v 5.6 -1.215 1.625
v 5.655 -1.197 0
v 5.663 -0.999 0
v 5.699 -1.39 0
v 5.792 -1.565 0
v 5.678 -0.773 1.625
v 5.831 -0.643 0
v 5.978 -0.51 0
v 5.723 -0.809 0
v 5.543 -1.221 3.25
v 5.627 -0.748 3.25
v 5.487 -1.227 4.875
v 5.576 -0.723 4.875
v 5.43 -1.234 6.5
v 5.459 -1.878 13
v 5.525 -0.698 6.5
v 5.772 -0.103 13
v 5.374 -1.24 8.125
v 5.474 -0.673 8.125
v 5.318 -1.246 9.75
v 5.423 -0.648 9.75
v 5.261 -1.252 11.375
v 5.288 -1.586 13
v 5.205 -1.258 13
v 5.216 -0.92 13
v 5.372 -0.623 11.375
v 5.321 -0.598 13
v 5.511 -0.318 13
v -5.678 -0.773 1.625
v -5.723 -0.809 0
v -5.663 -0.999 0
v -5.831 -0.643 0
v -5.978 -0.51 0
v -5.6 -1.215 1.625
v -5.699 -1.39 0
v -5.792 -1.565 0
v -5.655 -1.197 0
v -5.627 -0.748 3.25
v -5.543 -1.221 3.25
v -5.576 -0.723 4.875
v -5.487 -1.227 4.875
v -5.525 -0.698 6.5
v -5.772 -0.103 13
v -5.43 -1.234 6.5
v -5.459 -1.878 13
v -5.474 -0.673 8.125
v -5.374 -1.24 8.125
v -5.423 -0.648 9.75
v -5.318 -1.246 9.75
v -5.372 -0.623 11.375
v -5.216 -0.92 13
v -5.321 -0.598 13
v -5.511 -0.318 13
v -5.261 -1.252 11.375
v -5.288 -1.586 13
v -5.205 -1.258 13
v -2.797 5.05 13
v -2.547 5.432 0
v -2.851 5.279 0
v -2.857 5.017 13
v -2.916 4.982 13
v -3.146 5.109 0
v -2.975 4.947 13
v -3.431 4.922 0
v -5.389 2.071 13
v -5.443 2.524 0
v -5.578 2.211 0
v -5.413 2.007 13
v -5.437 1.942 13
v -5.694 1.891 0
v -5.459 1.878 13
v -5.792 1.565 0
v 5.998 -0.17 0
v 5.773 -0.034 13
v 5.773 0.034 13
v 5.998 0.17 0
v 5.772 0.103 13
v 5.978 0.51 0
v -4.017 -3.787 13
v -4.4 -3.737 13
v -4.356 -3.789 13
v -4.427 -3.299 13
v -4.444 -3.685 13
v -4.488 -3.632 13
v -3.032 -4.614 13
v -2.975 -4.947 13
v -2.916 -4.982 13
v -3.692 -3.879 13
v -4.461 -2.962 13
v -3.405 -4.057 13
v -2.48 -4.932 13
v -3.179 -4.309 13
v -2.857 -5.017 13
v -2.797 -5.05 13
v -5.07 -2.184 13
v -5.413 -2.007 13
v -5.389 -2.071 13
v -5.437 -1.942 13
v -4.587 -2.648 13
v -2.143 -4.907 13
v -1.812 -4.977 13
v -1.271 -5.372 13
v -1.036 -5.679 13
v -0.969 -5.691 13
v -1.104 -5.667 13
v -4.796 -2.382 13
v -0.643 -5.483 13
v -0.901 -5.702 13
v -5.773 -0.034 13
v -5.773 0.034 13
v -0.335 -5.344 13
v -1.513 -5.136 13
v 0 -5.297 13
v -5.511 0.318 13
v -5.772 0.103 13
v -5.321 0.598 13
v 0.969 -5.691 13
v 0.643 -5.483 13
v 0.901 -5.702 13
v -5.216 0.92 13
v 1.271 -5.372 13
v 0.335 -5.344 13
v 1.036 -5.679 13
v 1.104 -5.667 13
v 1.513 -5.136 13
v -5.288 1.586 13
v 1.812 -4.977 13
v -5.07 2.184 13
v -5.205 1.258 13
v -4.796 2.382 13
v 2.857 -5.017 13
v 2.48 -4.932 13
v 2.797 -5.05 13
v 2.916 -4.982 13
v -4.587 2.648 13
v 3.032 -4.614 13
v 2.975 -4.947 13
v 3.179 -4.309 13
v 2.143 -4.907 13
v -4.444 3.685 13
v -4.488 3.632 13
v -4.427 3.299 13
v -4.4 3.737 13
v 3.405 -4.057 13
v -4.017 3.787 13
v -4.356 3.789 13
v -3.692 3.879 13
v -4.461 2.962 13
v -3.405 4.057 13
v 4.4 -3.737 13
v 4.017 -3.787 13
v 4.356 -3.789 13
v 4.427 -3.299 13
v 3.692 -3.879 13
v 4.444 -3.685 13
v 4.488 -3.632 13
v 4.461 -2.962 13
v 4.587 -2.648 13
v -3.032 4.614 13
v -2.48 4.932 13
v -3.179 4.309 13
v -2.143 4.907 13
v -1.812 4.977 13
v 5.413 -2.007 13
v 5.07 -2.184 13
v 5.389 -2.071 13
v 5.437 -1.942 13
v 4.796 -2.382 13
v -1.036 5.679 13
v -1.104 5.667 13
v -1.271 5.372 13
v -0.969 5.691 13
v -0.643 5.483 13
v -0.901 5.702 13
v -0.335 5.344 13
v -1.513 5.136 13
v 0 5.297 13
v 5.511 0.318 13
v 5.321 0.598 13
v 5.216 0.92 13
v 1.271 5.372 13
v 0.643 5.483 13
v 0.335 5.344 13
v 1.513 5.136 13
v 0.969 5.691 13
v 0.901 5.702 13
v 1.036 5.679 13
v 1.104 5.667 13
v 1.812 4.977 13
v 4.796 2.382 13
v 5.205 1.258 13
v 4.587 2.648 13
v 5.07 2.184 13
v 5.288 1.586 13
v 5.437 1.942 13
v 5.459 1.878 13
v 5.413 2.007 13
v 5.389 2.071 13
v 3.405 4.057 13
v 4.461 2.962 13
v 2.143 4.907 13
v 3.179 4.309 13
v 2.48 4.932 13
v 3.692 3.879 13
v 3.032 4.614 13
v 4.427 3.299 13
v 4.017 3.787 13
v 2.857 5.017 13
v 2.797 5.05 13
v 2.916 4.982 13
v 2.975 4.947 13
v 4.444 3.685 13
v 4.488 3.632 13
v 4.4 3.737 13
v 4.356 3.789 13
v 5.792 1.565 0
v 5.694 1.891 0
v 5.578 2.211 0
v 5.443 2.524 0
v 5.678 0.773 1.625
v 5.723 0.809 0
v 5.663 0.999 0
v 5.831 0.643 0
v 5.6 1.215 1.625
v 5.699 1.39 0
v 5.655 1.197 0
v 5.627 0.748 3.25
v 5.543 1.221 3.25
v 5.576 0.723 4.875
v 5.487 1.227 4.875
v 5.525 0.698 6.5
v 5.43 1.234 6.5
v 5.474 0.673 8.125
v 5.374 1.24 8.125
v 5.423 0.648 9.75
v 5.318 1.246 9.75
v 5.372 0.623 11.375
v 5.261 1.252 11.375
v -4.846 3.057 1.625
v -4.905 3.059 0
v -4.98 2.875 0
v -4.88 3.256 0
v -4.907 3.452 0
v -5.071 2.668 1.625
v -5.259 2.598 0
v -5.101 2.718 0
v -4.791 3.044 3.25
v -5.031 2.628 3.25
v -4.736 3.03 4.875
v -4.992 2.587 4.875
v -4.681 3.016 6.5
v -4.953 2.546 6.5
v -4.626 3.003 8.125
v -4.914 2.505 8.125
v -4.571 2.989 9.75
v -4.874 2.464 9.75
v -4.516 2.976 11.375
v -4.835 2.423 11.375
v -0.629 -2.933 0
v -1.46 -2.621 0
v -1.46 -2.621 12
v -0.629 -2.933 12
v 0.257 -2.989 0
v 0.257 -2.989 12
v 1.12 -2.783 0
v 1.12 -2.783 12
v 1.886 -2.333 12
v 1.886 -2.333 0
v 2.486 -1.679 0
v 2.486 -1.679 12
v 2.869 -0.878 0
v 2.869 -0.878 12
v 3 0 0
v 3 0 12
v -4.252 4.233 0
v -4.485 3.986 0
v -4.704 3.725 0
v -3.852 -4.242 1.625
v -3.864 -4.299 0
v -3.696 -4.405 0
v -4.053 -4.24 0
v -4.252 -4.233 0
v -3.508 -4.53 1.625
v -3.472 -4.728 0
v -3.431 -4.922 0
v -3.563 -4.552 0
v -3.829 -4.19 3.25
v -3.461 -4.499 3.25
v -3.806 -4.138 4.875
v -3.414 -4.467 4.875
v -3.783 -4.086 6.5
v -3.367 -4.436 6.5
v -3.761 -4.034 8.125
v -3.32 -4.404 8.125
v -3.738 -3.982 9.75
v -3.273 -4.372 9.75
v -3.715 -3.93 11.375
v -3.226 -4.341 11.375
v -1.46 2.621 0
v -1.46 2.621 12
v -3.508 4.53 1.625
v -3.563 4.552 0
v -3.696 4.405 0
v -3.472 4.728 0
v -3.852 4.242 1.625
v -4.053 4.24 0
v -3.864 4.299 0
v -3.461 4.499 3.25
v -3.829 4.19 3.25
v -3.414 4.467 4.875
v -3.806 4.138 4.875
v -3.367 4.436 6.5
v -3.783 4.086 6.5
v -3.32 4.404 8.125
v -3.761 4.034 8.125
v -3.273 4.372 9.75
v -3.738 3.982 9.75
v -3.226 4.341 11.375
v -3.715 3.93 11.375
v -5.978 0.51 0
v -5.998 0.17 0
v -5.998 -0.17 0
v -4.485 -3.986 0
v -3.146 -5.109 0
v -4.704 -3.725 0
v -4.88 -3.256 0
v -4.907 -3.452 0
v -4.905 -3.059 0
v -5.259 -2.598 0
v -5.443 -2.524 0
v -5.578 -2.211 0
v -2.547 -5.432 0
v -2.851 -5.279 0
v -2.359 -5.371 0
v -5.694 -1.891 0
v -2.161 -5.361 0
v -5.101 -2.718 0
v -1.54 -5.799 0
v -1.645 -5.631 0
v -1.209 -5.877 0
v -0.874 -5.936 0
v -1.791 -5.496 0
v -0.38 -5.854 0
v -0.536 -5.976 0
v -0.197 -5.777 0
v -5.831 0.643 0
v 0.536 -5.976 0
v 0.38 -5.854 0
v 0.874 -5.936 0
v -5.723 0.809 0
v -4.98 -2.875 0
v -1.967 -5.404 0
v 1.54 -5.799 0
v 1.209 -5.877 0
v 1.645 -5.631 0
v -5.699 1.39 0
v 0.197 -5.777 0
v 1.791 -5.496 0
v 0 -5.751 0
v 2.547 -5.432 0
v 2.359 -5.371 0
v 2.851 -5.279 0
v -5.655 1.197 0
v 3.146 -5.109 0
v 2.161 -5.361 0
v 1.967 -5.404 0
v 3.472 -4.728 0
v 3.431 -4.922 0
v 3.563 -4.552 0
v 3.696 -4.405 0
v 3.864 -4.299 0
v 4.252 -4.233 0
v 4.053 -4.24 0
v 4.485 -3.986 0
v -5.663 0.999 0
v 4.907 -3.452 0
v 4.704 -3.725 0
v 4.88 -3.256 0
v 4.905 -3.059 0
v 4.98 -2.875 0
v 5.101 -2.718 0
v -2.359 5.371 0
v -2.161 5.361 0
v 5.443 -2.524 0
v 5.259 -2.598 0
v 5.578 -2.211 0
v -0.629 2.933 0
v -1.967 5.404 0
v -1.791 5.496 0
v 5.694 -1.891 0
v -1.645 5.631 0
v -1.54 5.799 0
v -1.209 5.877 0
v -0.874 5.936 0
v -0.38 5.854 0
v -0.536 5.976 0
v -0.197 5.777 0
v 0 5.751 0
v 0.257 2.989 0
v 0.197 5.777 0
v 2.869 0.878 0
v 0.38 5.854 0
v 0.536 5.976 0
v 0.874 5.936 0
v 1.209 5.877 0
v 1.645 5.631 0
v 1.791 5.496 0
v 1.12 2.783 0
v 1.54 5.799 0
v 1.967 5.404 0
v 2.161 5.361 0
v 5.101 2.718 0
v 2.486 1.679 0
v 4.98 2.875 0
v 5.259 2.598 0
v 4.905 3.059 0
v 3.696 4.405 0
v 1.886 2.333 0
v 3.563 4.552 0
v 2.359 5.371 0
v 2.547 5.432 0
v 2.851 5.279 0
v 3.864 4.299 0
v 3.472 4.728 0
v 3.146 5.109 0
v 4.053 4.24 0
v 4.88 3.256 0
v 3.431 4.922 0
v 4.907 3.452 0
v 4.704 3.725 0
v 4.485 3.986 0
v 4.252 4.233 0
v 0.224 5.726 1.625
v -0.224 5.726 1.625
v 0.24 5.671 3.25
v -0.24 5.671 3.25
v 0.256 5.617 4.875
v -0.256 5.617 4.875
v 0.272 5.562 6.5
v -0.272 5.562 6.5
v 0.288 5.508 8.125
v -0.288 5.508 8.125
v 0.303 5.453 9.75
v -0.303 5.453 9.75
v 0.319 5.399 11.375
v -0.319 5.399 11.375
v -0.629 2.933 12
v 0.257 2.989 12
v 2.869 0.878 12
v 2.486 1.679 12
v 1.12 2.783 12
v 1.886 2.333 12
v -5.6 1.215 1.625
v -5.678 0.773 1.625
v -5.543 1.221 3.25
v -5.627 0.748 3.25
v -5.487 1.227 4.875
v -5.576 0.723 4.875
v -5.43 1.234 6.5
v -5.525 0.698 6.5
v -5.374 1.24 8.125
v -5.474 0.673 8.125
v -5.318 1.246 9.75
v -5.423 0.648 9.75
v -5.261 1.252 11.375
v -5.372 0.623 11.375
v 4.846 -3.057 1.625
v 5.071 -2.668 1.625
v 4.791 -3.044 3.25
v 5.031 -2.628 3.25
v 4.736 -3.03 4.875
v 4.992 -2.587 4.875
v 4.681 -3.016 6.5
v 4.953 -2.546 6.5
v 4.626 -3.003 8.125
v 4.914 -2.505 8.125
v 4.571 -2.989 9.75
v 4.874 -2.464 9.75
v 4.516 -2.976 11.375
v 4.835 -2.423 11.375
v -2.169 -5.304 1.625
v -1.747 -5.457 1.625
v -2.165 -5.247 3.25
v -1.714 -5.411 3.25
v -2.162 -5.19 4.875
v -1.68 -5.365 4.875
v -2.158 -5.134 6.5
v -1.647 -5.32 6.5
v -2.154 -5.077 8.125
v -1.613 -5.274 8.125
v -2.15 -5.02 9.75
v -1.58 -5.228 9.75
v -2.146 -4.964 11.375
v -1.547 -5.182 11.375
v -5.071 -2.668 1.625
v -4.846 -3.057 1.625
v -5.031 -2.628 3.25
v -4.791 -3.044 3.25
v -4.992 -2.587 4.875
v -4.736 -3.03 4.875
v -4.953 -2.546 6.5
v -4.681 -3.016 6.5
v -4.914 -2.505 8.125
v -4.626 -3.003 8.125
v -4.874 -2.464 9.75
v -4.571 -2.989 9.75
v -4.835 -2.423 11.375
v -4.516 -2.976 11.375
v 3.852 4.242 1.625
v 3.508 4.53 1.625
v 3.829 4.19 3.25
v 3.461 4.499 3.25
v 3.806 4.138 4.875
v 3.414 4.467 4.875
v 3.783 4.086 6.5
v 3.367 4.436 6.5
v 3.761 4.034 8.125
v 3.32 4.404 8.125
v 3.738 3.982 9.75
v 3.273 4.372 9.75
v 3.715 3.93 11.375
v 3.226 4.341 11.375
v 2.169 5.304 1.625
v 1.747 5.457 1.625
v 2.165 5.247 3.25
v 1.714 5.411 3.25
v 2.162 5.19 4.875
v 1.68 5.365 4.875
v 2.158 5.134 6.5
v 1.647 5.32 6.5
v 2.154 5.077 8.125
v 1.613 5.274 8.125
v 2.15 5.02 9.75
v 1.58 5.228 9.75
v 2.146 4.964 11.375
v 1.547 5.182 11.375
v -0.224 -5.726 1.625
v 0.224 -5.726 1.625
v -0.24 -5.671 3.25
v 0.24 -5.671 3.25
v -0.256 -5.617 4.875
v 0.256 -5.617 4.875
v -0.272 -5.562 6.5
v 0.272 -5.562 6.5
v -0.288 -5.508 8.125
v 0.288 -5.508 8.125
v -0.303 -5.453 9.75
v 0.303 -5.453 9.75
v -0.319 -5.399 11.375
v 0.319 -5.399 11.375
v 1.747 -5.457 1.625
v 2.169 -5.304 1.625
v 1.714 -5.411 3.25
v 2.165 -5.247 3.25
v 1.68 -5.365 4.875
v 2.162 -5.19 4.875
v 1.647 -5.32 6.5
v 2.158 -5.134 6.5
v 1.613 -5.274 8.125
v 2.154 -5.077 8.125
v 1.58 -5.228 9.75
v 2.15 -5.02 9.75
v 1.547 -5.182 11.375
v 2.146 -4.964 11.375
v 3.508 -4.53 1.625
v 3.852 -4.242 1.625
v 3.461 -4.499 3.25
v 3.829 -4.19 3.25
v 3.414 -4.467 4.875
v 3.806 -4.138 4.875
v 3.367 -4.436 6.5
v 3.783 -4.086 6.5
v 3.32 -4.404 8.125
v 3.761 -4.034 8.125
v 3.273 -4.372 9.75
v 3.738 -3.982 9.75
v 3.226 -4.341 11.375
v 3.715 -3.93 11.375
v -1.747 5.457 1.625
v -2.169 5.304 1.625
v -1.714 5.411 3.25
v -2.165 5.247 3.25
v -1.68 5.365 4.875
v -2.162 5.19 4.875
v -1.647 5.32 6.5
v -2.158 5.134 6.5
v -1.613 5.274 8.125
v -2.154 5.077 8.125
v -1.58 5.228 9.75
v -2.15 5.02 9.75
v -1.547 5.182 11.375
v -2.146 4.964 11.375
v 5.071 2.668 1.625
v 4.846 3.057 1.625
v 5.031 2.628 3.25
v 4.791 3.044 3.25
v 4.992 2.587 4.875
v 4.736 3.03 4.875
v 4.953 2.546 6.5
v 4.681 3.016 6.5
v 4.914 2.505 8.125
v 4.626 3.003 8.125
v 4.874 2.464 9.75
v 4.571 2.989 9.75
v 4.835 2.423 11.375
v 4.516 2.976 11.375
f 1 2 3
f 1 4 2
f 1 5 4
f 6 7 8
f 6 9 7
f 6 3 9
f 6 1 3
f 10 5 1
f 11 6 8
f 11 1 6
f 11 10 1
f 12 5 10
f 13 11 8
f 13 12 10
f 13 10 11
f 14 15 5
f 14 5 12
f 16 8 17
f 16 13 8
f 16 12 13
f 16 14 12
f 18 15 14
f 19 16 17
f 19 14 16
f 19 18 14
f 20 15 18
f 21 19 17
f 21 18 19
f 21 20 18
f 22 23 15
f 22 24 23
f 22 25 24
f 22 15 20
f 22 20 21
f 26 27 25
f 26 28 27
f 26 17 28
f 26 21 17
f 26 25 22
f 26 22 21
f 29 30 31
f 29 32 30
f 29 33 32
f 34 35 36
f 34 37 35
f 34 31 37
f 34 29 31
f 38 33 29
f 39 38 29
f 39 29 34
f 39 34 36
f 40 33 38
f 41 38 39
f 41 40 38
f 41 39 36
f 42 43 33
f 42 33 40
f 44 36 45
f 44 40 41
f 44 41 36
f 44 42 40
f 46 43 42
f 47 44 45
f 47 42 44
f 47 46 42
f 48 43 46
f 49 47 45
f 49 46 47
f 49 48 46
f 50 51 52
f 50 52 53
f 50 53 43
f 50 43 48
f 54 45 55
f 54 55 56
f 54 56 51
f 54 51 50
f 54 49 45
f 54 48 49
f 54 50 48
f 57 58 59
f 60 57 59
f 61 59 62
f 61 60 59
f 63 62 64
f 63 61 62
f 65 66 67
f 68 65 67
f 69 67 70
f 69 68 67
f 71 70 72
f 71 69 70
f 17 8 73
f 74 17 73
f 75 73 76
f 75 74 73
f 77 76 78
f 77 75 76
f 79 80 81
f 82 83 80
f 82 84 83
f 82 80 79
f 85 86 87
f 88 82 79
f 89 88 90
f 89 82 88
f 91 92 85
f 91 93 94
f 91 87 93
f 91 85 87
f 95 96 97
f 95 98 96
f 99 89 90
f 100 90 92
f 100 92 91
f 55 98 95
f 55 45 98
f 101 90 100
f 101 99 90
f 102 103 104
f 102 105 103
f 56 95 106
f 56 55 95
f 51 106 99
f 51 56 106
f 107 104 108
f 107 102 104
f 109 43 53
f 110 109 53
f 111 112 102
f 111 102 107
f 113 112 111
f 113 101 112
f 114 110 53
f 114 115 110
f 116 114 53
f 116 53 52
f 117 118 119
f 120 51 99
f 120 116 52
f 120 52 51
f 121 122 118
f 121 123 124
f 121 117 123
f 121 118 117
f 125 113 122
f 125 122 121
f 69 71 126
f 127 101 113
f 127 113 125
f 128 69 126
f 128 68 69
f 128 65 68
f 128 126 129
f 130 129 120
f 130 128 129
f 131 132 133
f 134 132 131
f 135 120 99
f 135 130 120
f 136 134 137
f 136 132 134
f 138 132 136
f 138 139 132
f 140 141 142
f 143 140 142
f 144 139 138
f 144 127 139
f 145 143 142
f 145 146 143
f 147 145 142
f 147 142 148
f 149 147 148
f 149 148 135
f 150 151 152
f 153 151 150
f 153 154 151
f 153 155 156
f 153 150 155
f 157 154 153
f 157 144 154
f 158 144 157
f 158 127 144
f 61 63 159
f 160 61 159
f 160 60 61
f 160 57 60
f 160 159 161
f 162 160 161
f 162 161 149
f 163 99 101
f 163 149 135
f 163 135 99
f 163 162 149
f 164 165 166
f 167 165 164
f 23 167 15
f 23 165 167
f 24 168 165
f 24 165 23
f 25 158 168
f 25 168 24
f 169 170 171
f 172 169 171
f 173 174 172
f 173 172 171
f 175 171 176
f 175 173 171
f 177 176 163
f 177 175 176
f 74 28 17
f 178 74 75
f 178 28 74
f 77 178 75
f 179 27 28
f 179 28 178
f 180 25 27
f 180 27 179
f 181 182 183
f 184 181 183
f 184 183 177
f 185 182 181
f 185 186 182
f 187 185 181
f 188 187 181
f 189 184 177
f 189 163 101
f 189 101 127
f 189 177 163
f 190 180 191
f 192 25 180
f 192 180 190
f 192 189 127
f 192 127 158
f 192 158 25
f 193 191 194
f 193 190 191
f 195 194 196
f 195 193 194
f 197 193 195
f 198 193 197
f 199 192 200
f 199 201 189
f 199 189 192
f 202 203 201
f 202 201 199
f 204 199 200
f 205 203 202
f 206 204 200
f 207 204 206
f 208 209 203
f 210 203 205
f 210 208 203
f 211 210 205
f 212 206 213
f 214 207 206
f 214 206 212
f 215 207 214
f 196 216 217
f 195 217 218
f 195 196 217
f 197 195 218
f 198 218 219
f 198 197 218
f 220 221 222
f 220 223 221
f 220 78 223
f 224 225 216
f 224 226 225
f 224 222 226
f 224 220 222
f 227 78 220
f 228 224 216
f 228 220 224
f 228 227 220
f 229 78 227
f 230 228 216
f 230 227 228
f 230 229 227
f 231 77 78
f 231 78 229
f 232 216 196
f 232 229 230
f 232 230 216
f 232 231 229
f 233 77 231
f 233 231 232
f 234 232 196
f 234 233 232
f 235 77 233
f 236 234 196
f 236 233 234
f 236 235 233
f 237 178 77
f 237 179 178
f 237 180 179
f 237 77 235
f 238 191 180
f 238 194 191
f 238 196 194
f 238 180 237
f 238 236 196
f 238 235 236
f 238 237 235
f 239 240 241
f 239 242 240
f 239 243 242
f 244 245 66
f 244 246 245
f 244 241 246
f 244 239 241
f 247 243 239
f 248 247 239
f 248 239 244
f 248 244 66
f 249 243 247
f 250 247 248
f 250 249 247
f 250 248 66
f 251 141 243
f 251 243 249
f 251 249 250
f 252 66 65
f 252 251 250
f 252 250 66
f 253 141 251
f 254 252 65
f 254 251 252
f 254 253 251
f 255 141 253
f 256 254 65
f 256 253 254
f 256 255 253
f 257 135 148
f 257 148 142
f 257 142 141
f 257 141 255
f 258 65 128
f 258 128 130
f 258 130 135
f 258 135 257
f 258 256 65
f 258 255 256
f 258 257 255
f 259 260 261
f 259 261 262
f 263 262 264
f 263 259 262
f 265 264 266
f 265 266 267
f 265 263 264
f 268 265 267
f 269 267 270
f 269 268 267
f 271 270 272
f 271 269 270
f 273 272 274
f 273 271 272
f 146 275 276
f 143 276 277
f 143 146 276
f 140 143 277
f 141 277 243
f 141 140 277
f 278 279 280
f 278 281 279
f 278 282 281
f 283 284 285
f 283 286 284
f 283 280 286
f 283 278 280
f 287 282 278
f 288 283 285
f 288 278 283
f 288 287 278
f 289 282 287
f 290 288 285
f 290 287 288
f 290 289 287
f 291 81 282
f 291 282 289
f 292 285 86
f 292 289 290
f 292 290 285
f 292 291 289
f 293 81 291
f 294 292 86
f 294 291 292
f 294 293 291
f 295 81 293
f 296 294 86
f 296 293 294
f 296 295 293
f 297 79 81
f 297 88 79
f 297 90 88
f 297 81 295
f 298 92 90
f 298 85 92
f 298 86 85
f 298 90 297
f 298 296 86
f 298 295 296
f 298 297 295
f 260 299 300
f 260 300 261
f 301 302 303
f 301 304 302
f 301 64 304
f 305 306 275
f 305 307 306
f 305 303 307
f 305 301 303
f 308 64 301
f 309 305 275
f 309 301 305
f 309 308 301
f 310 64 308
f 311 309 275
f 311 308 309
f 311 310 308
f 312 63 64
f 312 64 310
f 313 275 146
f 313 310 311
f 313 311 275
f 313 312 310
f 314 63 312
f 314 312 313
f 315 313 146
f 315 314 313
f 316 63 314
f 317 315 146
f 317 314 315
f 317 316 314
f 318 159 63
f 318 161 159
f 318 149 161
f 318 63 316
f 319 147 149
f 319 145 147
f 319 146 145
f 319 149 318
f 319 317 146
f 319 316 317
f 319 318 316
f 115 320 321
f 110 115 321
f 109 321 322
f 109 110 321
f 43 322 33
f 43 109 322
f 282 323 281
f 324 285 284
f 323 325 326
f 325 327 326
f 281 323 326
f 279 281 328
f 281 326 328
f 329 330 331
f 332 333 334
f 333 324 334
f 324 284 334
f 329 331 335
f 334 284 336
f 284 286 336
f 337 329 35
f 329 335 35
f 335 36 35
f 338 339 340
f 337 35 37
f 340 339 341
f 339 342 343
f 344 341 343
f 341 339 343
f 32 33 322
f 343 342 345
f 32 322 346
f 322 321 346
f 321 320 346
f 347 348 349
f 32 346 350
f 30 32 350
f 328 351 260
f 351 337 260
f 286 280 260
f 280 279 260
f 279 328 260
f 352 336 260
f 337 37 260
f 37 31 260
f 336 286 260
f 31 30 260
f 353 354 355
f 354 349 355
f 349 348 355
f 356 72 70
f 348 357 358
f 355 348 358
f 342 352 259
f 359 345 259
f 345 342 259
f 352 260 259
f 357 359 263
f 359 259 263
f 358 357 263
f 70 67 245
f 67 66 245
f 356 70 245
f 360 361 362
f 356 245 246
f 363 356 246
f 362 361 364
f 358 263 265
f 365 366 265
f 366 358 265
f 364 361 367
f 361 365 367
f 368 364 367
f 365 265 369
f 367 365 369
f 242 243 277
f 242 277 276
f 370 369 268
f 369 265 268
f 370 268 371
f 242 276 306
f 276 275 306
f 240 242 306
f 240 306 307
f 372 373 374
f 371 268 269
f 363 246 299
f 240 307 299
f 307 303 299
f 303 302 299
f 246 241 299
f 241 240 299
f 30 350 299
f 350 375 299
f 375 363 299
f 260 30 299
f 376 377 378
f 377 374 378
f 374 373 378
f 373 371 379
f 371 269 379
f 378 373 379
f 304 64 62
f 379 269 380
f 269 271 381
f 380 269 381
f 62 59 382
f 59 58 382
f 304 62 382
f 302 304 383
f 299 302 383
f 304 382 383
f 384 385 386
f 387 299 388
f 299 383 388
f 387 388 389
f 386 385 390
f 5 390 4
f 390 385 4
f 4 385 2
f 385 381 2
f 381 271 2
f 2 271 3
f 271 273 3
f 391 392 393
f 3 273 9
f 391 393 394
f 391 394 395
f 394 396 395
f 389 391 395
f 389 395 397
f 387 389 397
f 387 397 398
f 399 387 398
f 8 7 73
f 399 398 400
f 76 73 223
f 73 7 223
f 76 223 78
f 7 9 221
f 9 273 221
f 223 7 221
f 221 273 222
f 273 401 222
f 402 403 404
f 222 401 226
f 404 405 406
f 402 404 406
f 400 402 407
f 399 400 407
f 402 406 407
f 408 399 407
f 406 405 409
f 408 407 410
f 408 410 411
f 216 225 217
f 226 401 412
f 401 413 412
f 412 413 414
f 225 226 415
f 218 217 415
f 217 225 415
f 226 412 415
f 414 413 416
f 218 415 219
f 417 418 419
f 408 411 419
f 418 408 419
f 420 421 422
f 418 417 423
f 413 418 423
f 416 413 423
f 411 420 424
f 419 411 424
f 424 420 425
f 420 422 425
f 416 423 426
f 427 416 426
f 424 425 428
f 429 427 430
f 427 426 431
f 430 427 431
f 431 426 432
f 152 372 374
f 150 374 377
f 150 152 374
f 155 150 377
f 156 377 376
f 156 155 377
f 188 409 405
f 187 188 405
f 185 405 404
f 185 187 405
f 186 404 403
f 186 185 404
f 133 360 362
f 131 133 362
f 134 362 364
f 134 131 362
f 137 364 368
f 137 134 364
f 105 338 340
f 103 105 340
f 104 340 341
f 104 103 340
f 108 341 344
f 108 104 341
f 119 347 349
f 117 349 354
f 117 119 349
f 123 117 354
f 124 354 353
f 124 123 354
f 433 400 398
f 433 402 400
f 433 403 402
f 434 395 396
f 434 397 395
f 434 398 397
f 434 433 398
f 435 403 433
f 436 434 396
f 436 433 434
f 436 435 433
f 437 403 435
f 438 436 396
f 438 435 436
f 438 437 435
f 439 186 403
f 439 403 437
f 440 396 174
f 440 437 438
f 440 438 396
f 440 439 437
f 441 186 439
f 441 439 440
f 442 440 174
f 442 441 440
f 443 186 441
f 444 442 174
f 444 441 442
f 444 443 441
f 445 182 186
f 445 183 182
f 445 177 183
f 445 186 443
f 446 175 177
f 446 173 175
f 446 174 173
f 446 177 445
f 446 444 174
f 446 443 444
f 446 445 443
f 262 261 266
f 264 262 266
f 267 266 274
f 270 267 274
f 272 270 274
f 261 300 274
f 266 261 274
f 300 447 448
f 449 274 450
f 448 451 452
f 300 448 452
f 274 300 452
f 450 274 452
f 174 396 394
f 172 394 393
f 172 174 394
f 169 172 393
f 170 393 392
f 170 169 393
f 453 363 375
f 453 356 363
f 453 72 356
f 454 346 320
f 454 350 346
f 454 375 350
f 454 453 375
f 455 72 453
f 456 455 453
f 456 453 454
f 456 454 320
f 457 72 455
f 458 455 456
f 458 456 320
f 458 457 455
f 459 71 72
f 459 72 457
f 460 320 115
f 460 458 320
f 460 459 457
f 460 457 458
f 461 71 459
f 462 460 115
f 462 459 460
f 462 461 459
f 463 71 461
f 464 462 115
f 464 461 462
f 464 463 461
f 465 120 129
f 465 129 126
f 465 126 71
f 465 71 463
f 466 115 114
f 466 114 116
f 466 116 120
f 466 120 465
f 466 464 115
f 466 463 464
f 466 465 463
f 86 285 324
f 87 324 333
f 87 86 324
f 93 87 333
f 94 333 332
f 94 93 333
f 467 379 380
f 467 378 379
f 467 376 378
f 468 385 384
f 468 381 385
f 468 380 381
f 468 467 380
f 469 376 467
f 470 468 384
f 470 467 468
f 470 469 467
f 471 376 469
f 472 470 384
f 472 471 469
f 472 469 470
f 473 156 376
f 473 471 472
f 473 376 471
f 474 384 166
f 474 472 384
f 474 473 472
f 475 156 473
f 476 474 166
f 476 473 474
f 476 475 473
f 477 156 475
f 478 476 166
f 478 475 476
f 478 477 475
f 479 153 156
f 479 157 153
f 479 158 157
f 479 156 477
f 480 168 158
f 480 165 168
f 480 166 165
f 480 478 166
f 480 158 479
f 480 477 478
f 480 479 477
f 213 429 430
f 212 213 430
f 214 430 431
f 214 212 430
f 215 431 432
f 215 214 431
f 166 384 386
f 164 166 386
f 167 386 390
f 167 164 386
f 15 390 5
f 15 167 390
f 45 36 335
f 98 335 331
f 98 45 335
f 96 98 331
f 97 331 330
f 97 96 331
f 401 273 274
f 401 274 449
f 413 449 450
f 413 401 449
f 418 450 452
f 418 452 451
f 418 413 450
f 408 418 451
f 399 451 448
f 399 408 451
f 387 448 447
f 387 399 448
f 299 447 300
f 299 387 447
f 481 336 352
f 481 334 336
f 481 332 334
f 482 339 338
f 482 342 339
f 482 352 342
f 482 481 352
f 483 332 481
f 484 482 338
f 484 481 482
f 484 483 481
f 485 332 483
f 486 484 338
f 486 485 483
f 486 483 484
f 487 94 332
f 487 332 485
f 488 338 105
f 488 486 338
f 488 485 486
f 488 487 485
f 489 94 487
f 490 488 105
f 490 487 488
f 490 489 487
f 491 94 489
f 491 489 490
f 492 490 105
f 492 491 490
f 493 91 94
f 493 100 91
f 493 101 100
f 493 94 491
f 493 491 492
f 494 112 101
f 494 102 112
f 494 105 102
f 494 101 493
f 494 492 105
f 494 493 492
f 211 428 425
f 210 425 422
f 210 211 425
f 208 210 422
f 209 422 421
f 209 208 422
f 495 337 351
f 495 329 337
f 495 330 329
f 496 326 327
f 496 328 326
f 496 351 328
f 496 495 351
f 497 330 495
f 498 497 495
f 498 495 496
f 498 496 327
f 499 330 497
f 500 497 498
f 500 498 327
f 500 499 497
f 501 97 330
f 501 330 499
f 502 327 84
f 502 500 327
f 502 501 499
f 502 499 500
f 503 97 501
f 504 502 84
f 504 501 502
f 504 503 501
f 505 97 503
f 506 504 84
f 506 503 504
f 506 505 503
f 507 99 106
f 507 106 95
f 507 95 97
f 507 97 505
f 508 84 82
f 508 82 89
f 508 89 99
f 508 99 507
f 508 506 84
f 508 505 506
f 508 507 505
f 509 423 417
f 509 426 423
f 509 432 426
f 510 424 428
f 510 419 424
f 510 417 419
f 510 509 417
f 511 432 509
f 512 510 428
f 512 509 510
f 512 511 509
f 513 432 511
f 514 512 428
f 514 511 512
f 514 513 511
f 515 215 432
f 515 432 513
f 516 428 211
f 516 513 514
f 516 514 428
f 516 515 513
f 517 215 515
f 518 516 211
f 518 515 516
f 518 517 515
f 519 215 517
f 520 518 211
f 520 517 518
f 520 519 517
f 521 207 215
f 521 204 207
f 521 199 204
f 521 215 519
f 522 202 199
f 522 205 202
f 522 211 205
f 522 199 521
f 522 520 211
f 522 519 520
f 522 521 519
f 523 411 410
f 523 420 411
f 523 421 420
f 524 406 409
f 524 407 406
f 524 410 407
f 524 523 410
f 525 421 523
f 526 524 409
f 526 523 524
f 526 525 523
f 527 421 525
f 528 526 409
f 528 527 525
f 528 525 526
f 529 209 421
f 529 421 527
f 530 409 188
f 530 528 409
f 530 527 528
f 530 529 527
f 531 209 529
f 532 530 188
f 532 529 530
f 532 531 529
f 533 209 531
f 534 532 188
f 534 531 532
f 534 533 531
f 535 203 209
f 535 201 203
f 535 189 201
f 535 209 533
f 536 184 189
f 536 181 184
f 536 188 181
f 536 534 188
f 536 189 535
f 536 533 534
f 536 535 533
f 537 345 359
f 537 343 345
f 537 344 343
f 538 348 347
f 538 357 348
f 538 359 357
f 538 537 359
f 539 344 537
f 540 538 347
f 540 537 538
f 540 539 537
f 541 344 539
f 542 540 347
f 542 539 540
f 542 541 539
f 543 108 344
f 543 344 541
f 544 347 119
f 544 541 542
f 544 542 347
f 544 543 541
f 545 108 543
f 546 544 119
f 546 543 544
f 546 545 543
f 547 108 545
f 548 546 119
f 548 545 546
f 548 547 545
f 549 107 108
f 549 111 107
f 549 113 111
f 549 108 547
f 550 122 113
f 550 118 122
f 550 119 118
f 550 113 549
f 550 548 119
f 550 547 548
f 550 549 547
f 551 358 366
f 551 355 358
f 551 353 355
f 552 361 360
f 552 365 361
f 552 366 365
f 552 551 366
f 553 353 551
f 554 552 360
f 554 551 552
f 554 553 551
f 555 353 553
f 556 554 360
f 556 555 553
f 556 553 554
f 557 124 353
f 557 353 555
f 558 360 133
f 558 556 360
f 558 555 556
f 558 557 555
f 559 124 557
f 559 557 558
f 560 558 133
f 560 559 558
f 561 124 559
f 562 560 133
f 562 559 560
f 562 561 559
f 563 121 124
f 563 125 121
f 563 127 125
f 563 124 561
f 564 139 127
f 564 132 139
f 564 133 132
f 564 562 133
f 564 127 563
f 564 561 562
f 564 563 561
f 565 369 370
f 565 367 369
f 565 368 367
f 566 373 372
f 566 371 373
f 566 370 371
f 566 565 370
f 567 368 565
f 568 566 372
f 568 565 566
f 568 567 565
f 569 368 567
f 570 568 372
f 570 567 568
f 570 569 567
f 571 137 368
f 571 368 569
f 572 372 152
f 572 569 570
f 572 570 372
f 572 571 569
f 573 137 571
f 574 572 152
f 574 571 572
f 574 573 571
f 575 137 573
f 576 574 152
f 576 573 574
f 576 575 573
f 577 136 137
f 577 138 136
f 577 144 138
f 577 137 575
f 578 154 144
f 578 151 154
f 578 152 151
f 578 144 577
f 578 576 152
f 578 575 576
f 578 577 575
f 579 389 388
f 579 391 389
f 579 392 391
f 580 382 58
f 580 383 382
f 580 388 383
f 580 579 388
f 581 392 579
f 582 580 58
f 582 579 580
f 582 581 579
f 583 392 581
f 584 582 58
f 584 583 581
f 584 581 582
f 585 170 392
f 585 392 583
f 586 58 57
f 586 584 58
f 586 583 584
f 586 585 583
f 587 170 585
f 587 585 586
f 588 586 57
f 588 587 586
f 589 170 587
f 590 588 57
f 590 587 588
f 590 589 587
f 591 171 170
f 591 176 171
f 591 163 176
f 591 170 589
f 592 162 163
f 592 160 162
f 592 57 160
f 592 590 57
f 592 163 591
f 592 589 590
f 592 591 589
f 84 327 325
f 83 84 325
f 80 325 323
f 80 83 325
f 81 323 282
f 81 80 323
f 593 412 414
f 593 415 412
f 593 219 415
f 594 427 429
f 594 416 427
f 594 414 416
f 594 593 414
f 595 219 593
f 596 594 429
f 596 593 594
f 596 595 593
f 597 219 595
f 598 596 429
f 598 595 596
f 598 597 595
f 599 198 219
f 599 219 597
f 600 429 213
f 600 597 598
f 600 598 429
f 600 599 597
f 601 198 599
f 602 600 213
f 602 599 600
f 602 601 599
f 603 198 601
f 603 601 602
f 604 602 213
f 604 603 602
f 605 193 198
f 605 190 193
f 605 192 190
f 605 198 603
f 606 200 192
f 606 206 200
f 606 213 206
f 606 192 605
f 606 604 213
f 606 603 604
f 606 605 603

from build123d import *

# Parameters (mm, degrees)
F0_R     = 6
F2_DEPTH = 13
F2_TAPER = 1
F3_DEPTH = 12
F5_R     = 0.7494732789
F6_DEPTH = 13
F6_TAPER = -2


with BuildPart() as f2:
    # F0 (on Top) → F2 (new body)
    with BuildSketch(Plane.XY):
        Circle(F0_R)
    extrude(amount=F2_DEPTH, taper=F2_TAPER)

    # F1 (on Top) → F3 (cut)
    with BuildSketch(Plane.XY):
        with BuildLine():
            ThreePointArc((-1.46, -2.6207632476), (1.5198684154, -2.5865034313), (3, 0))
            ThreePointArc((3, 0), (1.5198684154, 2.5865034313), (-1.46, 2.6207632476))
            Line((-1.46, 2.6207632476), (-1.46, 0))
            Line((-1.46, 0), (-1.46, -2.6207632476))
        make_face()
    extrude(amount=F3_DEPTH, mode=Mode.SUBTRACT)

    # F5 (on face) → F6 (cut)
    with BuildSketch(Plane(origin=(0, 0, 0), x_dir=(1, 0, 0), z_dir=(0, 0, -1))):
        with Locations((0, 6.5)):
            Circle(F5_R)
        with Locations((-2.2231309316, 6.1080020351)):
            Circle(F5_R)
        with Locations((-4.178119463, 4.9792888803)):
            Circle(F5_R)
        with Locations((-5.6291651246, 3.25)):
            Circle(F5_R)
        with Locations((-6.4012503946, 1.1287131548)):
            Circle(F5_R)
        with Locations((-6.4012503946, -1.1287131548)):
            Circle(F5_R)
        with Locations((-5.6291651246, -3.25)):
            Circle(F5_R)
        with Locations((-4.178119463, -4.9792888803)):
            Circle(F5_R)
        with Locations((-2.2231309316, -6.1080020351)):
            Circle(F5_R)
        with Locations((0, -6.5)):
            Circle(F5_R)
        with Locations((2.2231309316, -6.1080020351)):
            Circle(F5_R)
        with Locations((4.178119463, -4.9792888803)):
            Circle(F5_R)
        with Locations((5.6291651246, -3.25)):
            Circle(F5_R)
        with Locations((6.4012503946, -1.1287131548)):
            Circle(F5_R)
        with Locations((6.4012503946, 1.1287131548)):
            Circle(F5_R)
        with Locations((5.6291651246, 3.25)):
            Circle(F5_R)
        with Locations((4.178119463, 4.9792888803)):
            Circle(F5_R)
        with Locations((2.2231309316, 6.1080020351)):
            Circle(F5_R)
    extrude(amount=-F6_DEPTH, taper=F6_TAPER, mode=Mode.SUBTRACT)


solid = f2.part
